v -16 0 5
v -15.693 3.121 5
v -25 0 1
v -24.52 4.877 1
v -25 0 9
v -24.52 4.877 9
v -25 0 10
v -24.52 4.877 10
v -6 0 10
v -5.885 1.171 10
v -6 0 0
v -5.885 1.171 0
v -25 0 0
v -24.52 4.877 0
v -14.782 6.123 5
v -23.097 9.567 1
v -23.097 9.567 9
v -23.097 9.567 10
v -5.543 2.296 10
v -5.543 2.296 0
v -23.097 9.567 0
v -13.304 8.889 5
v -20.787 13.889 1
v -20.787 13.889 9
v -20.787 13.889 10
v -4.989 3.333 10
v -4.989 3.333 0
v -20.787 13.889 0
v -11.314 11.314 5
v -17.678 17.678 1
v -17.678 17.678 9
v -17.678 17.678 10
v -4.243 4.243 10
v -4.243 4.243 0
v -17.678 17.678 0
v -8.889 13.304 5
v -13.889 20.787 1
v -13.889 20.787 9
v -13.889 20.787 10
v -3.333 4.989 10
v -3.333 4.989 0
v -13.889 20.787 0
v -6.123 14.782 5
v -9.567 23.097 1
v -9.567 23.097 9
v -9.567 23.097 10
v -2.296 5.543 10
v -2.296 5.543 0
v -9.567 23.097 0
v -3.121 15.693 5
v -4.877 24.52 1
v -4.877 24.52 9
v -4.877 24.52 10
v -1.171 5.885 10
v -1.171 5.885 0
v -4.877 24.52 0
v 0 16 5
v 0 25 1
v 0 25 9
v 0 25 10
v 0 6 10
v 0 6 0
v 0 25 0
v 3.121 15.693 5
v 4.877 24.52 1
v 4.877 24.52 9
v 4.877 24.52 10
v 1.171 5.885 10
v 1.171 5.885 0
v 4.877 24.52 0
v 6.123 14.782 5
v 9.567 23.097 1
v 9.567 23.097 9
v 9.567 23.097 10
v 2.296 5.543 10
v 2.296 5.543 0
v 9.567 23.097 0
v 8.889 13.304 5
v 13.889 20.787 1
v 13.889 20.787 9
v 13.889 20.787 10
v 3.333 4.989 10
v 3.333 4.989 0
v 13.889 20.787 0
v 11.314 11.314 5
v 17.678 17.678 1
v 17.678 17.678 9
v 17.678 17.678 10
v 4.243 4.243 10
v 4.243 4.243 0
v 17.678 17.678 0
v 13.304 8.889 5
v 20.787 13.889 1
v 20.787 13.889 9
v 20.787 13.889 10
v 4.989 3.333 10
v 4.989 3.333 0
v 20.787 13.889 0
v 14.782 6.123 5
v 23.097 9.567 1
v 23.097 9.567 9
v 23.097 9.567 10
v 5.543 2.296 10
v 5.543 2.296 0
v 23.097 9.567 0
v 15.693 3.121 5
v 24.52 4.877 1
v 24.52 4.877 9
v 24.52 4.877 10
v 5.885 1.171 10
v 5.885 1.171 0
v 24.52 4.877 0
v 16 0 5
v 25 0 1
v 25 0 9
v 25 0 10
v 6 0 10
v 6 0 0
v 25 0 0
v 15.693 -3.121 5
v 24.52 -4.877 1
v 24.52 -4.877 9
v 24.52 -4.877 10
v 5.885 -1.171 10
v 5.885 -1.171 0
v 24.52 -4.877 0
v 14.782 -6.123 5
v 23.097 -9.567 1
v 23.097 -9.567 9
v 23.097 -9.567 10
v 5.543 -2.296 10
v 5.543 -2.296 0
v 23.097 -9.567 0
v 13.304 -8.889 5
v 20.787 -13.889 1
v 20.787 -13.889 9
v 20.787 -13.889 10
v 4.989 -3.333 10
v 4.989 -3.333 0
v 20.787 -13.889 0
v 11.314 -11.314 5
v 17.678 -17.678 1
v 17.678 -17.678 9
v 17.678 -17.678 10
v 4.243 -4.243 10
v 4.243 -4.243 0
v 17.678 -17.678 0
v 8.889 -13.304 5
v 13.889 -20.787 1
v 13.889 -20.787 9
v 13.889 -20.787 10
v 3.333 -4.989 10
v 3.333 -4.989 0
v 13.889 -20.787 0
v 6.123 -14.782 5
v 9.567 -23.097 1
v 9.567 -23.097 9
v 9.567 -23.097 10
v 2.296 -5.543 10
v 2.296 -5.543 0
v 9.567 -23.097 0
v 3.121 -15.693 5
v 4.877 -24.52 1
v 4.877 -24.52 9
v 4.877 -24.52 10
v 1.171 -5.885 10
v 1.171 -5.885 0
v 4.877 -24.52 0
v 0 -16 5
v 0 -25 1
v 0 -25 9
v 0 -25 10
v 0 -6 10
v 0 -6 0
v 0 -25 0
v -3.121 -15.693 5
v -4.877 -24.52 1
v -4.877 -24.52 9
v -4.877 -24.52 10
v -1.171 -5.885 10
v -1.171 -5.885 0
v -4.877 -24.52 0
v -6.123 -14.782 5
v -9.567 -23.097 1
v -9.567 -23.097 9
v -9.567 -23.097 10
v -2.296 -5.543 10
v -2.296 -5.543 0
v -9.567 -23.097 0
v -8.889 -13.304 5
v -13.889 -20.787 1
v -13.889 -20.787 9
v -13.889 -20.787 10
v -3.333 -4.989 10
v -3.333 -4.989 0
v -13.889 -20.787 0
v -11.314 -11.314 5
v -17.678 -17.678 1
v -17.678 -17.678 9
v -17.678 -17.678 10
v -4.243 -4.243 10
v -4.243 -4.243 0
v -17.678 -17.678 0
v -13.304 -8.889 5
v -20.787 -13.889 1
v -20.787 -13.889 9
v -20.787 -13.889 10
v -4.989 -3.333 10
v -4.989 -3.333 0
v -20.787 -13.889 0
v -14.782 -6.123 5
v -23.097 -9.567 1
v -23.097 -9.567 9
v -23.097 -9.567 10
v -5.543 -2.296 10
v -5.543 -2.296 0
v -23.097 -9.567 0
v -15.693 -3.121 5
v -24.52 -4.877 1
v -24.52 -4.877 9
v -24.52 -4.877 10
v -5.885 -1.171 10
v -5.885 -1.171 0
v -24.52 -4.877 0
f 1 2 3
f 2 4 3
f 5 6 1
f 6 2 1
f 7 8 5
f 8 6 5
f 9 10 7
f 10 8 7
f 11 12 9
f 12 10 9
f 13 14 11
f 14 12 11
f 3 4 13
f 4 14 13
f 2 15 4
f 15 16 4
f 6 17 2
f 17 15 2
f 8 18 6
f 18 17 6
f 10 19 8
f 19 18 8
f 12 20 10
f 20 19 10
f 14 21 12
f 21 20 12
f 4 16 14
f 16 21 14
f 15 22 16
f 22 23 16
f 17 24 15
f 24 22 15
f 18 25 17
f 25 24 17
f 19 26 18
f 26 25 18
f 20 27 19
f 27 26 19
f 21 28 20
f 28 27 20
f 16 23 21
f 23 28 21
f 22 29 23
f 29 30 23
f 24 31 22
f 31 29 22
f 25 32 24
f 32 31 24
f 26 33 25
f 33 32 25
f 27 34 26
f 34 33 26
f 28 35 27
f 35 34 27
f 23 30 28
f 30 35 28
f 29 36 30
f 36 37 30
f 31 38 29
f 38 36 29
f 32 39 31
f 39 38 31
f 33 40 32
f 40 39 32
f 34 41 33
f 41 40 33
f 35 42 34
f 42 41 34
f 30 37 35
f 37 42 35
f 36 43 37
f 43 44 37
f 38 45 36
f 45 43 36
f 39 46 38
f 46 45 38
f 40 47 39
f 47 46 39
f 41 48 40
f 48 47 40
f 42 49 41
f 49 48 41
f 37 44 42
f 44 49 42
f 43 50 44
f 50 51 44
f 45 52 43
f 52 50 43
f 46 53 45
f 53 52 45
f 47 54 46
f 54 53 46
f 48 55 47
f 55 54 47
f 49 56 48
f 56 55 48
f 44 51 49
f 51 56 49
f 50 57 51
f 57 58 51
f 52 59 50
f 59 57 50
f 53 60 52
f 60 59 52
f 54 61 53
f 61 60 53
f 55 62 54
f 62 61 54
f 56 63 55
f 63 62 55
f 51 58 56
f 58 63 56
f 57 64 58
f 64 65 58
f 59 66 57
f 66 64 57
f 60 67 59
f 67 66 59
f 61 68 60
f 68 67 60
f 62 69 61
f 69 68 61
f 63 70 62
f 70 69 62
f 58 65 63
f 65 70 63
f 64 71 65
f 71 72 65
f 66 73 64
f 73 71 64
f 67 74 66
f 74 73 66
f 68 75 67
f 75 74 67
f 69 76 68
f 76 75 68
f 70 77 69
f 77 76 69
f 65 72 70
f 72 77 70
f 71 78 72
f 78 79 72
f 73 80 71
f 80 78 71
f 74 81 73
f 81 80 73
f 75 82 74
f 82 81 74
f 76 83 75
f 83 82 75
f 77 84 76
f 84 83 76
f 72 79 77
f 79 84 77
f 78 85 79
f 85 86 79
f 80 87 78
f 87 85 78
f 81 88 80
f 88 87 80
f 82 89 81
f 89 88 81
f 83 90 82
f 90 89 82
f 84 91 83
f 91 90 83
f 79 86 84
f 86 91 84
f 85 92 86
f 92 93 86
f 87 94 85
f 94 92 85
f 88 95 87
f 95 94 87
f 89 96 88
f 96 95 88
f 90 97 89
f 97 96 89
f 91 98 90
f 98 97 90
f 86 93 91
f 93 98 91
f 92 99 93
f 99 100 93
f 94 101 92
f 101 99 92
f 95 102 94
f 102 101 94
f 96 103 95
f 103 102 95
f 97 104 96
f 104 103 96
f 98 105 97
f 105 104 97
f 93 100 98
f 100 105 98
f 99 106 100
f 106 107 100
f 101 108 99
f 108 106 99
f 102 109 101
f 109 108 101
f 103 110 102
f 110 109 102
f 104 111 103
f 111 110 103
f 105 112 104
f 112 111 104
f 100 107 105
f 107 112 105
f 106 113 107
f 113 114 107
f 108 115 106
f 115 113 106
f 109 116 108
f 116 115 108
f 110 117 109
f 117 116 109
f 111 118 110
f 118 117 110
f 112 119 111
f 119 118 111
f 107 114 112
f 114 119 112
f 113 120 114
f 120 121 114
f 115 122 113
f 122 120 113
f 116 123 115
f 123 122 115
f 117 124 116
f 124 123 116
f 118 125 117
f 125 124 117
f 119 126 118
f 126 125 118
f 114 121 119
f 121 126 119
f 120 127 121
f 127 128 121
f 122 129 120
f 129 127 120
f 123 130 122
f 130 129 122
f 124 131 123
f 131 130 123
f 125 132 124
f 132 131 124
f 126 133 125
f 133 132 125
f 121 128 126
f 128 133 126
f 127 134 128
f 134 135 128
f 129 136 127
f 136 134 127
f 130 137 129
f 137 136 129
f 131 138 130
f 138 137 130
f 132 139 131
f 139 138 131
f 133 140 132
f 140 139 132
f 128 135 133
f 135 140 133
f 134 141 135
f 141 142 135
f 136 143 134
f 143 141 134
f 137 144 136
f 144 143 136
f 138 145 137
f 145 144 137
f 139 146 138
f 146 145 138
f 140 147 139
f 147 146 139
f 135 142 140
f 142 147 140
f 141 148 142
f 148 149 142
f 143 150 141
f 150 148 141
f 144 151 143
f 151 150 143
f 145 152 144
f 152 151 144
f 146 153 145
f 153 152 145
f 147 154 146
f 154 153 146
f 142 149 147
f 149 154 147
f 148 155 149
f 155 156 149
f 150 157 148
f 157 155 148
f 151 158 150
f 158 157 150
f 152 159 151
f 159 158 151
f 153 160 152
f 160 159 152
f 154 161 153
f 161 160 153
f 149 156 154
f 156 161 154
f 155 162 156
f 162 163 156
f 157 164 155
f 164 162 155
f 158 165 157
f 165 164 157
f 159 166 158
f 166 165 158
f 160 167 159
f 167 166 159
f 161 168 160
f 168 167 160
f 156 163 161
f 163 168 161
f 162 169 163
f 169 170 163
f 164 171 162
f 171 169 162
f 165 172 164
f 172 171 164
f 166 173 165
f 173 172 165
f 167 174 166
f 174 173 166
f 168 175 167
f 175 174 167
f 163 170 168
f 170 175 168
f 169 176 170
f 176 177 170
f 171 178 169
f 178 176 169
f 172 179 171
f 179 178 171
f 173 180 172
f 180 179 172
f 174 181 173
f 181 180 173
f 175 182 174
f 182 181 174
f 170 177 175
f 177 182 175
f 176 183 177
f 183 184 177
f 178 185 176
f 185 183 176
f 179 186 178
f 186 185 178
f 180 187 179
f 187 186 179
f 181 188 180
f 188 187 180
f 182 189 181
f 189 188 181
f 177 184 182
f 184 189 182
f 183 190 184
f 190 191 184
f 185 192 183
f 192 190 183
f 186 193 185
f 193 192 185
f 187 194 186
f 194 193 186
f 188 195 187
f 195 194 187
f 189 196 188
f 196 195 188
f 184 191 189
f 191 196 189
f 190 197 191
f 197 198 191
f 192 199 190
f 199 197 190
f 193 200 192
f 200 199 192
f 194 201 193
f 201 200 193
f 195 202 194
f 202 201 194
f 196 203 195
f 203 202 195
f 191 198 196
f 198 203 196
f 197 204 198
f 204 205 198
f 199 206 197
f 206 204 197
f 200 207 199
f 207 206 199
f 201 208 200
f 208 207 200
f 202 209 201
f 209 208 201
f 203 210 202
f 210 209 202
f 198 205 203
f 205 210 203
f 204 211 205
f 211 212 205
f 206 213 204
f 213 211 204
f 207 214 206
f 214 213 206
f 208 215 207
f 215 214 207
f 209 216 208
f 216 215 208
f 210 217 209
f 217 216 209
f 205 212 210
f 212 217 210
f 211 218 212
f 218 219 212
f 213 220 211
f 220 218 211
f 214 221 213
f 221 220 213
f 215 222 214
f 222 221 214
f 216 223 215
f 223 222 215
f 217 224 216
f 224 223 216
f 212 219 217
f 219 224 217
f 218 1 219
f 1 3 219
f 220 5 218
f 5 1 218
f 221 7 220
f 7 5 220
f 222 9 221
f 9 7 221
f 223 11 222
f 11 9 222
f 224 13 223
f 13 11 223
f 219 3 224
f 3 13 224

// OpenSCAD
$fn = 32;

// ----------------------------------------------------------------------
// Revolved part: V-groove pulley R25
// ----------------------------------------------------------------------

// --- parameters (mm) ---
bore_r = 6;               // bore radius
rim_r = 25;               // rim radius
rim_t = 10;               // rim width
groove_r = 16;            // groove root radius
groove_w = 4;             // groove half width
revolve_angle = 360;      // revolve sweep, degrees

bore_d = 2 * bore_r;
rim_d = 2 * rim_r;
groove_d = 2 * groove_r;

profile = [[6, 0], [25, 0], [25, 1], [16, 5], [25, 9], [25, 10], [6, 10]];  // primary outline, 7 points, counter clockwise

// --- the one profile operation ---
rotate_extrude(angle = revolve_angle) polygon(points = profile);
